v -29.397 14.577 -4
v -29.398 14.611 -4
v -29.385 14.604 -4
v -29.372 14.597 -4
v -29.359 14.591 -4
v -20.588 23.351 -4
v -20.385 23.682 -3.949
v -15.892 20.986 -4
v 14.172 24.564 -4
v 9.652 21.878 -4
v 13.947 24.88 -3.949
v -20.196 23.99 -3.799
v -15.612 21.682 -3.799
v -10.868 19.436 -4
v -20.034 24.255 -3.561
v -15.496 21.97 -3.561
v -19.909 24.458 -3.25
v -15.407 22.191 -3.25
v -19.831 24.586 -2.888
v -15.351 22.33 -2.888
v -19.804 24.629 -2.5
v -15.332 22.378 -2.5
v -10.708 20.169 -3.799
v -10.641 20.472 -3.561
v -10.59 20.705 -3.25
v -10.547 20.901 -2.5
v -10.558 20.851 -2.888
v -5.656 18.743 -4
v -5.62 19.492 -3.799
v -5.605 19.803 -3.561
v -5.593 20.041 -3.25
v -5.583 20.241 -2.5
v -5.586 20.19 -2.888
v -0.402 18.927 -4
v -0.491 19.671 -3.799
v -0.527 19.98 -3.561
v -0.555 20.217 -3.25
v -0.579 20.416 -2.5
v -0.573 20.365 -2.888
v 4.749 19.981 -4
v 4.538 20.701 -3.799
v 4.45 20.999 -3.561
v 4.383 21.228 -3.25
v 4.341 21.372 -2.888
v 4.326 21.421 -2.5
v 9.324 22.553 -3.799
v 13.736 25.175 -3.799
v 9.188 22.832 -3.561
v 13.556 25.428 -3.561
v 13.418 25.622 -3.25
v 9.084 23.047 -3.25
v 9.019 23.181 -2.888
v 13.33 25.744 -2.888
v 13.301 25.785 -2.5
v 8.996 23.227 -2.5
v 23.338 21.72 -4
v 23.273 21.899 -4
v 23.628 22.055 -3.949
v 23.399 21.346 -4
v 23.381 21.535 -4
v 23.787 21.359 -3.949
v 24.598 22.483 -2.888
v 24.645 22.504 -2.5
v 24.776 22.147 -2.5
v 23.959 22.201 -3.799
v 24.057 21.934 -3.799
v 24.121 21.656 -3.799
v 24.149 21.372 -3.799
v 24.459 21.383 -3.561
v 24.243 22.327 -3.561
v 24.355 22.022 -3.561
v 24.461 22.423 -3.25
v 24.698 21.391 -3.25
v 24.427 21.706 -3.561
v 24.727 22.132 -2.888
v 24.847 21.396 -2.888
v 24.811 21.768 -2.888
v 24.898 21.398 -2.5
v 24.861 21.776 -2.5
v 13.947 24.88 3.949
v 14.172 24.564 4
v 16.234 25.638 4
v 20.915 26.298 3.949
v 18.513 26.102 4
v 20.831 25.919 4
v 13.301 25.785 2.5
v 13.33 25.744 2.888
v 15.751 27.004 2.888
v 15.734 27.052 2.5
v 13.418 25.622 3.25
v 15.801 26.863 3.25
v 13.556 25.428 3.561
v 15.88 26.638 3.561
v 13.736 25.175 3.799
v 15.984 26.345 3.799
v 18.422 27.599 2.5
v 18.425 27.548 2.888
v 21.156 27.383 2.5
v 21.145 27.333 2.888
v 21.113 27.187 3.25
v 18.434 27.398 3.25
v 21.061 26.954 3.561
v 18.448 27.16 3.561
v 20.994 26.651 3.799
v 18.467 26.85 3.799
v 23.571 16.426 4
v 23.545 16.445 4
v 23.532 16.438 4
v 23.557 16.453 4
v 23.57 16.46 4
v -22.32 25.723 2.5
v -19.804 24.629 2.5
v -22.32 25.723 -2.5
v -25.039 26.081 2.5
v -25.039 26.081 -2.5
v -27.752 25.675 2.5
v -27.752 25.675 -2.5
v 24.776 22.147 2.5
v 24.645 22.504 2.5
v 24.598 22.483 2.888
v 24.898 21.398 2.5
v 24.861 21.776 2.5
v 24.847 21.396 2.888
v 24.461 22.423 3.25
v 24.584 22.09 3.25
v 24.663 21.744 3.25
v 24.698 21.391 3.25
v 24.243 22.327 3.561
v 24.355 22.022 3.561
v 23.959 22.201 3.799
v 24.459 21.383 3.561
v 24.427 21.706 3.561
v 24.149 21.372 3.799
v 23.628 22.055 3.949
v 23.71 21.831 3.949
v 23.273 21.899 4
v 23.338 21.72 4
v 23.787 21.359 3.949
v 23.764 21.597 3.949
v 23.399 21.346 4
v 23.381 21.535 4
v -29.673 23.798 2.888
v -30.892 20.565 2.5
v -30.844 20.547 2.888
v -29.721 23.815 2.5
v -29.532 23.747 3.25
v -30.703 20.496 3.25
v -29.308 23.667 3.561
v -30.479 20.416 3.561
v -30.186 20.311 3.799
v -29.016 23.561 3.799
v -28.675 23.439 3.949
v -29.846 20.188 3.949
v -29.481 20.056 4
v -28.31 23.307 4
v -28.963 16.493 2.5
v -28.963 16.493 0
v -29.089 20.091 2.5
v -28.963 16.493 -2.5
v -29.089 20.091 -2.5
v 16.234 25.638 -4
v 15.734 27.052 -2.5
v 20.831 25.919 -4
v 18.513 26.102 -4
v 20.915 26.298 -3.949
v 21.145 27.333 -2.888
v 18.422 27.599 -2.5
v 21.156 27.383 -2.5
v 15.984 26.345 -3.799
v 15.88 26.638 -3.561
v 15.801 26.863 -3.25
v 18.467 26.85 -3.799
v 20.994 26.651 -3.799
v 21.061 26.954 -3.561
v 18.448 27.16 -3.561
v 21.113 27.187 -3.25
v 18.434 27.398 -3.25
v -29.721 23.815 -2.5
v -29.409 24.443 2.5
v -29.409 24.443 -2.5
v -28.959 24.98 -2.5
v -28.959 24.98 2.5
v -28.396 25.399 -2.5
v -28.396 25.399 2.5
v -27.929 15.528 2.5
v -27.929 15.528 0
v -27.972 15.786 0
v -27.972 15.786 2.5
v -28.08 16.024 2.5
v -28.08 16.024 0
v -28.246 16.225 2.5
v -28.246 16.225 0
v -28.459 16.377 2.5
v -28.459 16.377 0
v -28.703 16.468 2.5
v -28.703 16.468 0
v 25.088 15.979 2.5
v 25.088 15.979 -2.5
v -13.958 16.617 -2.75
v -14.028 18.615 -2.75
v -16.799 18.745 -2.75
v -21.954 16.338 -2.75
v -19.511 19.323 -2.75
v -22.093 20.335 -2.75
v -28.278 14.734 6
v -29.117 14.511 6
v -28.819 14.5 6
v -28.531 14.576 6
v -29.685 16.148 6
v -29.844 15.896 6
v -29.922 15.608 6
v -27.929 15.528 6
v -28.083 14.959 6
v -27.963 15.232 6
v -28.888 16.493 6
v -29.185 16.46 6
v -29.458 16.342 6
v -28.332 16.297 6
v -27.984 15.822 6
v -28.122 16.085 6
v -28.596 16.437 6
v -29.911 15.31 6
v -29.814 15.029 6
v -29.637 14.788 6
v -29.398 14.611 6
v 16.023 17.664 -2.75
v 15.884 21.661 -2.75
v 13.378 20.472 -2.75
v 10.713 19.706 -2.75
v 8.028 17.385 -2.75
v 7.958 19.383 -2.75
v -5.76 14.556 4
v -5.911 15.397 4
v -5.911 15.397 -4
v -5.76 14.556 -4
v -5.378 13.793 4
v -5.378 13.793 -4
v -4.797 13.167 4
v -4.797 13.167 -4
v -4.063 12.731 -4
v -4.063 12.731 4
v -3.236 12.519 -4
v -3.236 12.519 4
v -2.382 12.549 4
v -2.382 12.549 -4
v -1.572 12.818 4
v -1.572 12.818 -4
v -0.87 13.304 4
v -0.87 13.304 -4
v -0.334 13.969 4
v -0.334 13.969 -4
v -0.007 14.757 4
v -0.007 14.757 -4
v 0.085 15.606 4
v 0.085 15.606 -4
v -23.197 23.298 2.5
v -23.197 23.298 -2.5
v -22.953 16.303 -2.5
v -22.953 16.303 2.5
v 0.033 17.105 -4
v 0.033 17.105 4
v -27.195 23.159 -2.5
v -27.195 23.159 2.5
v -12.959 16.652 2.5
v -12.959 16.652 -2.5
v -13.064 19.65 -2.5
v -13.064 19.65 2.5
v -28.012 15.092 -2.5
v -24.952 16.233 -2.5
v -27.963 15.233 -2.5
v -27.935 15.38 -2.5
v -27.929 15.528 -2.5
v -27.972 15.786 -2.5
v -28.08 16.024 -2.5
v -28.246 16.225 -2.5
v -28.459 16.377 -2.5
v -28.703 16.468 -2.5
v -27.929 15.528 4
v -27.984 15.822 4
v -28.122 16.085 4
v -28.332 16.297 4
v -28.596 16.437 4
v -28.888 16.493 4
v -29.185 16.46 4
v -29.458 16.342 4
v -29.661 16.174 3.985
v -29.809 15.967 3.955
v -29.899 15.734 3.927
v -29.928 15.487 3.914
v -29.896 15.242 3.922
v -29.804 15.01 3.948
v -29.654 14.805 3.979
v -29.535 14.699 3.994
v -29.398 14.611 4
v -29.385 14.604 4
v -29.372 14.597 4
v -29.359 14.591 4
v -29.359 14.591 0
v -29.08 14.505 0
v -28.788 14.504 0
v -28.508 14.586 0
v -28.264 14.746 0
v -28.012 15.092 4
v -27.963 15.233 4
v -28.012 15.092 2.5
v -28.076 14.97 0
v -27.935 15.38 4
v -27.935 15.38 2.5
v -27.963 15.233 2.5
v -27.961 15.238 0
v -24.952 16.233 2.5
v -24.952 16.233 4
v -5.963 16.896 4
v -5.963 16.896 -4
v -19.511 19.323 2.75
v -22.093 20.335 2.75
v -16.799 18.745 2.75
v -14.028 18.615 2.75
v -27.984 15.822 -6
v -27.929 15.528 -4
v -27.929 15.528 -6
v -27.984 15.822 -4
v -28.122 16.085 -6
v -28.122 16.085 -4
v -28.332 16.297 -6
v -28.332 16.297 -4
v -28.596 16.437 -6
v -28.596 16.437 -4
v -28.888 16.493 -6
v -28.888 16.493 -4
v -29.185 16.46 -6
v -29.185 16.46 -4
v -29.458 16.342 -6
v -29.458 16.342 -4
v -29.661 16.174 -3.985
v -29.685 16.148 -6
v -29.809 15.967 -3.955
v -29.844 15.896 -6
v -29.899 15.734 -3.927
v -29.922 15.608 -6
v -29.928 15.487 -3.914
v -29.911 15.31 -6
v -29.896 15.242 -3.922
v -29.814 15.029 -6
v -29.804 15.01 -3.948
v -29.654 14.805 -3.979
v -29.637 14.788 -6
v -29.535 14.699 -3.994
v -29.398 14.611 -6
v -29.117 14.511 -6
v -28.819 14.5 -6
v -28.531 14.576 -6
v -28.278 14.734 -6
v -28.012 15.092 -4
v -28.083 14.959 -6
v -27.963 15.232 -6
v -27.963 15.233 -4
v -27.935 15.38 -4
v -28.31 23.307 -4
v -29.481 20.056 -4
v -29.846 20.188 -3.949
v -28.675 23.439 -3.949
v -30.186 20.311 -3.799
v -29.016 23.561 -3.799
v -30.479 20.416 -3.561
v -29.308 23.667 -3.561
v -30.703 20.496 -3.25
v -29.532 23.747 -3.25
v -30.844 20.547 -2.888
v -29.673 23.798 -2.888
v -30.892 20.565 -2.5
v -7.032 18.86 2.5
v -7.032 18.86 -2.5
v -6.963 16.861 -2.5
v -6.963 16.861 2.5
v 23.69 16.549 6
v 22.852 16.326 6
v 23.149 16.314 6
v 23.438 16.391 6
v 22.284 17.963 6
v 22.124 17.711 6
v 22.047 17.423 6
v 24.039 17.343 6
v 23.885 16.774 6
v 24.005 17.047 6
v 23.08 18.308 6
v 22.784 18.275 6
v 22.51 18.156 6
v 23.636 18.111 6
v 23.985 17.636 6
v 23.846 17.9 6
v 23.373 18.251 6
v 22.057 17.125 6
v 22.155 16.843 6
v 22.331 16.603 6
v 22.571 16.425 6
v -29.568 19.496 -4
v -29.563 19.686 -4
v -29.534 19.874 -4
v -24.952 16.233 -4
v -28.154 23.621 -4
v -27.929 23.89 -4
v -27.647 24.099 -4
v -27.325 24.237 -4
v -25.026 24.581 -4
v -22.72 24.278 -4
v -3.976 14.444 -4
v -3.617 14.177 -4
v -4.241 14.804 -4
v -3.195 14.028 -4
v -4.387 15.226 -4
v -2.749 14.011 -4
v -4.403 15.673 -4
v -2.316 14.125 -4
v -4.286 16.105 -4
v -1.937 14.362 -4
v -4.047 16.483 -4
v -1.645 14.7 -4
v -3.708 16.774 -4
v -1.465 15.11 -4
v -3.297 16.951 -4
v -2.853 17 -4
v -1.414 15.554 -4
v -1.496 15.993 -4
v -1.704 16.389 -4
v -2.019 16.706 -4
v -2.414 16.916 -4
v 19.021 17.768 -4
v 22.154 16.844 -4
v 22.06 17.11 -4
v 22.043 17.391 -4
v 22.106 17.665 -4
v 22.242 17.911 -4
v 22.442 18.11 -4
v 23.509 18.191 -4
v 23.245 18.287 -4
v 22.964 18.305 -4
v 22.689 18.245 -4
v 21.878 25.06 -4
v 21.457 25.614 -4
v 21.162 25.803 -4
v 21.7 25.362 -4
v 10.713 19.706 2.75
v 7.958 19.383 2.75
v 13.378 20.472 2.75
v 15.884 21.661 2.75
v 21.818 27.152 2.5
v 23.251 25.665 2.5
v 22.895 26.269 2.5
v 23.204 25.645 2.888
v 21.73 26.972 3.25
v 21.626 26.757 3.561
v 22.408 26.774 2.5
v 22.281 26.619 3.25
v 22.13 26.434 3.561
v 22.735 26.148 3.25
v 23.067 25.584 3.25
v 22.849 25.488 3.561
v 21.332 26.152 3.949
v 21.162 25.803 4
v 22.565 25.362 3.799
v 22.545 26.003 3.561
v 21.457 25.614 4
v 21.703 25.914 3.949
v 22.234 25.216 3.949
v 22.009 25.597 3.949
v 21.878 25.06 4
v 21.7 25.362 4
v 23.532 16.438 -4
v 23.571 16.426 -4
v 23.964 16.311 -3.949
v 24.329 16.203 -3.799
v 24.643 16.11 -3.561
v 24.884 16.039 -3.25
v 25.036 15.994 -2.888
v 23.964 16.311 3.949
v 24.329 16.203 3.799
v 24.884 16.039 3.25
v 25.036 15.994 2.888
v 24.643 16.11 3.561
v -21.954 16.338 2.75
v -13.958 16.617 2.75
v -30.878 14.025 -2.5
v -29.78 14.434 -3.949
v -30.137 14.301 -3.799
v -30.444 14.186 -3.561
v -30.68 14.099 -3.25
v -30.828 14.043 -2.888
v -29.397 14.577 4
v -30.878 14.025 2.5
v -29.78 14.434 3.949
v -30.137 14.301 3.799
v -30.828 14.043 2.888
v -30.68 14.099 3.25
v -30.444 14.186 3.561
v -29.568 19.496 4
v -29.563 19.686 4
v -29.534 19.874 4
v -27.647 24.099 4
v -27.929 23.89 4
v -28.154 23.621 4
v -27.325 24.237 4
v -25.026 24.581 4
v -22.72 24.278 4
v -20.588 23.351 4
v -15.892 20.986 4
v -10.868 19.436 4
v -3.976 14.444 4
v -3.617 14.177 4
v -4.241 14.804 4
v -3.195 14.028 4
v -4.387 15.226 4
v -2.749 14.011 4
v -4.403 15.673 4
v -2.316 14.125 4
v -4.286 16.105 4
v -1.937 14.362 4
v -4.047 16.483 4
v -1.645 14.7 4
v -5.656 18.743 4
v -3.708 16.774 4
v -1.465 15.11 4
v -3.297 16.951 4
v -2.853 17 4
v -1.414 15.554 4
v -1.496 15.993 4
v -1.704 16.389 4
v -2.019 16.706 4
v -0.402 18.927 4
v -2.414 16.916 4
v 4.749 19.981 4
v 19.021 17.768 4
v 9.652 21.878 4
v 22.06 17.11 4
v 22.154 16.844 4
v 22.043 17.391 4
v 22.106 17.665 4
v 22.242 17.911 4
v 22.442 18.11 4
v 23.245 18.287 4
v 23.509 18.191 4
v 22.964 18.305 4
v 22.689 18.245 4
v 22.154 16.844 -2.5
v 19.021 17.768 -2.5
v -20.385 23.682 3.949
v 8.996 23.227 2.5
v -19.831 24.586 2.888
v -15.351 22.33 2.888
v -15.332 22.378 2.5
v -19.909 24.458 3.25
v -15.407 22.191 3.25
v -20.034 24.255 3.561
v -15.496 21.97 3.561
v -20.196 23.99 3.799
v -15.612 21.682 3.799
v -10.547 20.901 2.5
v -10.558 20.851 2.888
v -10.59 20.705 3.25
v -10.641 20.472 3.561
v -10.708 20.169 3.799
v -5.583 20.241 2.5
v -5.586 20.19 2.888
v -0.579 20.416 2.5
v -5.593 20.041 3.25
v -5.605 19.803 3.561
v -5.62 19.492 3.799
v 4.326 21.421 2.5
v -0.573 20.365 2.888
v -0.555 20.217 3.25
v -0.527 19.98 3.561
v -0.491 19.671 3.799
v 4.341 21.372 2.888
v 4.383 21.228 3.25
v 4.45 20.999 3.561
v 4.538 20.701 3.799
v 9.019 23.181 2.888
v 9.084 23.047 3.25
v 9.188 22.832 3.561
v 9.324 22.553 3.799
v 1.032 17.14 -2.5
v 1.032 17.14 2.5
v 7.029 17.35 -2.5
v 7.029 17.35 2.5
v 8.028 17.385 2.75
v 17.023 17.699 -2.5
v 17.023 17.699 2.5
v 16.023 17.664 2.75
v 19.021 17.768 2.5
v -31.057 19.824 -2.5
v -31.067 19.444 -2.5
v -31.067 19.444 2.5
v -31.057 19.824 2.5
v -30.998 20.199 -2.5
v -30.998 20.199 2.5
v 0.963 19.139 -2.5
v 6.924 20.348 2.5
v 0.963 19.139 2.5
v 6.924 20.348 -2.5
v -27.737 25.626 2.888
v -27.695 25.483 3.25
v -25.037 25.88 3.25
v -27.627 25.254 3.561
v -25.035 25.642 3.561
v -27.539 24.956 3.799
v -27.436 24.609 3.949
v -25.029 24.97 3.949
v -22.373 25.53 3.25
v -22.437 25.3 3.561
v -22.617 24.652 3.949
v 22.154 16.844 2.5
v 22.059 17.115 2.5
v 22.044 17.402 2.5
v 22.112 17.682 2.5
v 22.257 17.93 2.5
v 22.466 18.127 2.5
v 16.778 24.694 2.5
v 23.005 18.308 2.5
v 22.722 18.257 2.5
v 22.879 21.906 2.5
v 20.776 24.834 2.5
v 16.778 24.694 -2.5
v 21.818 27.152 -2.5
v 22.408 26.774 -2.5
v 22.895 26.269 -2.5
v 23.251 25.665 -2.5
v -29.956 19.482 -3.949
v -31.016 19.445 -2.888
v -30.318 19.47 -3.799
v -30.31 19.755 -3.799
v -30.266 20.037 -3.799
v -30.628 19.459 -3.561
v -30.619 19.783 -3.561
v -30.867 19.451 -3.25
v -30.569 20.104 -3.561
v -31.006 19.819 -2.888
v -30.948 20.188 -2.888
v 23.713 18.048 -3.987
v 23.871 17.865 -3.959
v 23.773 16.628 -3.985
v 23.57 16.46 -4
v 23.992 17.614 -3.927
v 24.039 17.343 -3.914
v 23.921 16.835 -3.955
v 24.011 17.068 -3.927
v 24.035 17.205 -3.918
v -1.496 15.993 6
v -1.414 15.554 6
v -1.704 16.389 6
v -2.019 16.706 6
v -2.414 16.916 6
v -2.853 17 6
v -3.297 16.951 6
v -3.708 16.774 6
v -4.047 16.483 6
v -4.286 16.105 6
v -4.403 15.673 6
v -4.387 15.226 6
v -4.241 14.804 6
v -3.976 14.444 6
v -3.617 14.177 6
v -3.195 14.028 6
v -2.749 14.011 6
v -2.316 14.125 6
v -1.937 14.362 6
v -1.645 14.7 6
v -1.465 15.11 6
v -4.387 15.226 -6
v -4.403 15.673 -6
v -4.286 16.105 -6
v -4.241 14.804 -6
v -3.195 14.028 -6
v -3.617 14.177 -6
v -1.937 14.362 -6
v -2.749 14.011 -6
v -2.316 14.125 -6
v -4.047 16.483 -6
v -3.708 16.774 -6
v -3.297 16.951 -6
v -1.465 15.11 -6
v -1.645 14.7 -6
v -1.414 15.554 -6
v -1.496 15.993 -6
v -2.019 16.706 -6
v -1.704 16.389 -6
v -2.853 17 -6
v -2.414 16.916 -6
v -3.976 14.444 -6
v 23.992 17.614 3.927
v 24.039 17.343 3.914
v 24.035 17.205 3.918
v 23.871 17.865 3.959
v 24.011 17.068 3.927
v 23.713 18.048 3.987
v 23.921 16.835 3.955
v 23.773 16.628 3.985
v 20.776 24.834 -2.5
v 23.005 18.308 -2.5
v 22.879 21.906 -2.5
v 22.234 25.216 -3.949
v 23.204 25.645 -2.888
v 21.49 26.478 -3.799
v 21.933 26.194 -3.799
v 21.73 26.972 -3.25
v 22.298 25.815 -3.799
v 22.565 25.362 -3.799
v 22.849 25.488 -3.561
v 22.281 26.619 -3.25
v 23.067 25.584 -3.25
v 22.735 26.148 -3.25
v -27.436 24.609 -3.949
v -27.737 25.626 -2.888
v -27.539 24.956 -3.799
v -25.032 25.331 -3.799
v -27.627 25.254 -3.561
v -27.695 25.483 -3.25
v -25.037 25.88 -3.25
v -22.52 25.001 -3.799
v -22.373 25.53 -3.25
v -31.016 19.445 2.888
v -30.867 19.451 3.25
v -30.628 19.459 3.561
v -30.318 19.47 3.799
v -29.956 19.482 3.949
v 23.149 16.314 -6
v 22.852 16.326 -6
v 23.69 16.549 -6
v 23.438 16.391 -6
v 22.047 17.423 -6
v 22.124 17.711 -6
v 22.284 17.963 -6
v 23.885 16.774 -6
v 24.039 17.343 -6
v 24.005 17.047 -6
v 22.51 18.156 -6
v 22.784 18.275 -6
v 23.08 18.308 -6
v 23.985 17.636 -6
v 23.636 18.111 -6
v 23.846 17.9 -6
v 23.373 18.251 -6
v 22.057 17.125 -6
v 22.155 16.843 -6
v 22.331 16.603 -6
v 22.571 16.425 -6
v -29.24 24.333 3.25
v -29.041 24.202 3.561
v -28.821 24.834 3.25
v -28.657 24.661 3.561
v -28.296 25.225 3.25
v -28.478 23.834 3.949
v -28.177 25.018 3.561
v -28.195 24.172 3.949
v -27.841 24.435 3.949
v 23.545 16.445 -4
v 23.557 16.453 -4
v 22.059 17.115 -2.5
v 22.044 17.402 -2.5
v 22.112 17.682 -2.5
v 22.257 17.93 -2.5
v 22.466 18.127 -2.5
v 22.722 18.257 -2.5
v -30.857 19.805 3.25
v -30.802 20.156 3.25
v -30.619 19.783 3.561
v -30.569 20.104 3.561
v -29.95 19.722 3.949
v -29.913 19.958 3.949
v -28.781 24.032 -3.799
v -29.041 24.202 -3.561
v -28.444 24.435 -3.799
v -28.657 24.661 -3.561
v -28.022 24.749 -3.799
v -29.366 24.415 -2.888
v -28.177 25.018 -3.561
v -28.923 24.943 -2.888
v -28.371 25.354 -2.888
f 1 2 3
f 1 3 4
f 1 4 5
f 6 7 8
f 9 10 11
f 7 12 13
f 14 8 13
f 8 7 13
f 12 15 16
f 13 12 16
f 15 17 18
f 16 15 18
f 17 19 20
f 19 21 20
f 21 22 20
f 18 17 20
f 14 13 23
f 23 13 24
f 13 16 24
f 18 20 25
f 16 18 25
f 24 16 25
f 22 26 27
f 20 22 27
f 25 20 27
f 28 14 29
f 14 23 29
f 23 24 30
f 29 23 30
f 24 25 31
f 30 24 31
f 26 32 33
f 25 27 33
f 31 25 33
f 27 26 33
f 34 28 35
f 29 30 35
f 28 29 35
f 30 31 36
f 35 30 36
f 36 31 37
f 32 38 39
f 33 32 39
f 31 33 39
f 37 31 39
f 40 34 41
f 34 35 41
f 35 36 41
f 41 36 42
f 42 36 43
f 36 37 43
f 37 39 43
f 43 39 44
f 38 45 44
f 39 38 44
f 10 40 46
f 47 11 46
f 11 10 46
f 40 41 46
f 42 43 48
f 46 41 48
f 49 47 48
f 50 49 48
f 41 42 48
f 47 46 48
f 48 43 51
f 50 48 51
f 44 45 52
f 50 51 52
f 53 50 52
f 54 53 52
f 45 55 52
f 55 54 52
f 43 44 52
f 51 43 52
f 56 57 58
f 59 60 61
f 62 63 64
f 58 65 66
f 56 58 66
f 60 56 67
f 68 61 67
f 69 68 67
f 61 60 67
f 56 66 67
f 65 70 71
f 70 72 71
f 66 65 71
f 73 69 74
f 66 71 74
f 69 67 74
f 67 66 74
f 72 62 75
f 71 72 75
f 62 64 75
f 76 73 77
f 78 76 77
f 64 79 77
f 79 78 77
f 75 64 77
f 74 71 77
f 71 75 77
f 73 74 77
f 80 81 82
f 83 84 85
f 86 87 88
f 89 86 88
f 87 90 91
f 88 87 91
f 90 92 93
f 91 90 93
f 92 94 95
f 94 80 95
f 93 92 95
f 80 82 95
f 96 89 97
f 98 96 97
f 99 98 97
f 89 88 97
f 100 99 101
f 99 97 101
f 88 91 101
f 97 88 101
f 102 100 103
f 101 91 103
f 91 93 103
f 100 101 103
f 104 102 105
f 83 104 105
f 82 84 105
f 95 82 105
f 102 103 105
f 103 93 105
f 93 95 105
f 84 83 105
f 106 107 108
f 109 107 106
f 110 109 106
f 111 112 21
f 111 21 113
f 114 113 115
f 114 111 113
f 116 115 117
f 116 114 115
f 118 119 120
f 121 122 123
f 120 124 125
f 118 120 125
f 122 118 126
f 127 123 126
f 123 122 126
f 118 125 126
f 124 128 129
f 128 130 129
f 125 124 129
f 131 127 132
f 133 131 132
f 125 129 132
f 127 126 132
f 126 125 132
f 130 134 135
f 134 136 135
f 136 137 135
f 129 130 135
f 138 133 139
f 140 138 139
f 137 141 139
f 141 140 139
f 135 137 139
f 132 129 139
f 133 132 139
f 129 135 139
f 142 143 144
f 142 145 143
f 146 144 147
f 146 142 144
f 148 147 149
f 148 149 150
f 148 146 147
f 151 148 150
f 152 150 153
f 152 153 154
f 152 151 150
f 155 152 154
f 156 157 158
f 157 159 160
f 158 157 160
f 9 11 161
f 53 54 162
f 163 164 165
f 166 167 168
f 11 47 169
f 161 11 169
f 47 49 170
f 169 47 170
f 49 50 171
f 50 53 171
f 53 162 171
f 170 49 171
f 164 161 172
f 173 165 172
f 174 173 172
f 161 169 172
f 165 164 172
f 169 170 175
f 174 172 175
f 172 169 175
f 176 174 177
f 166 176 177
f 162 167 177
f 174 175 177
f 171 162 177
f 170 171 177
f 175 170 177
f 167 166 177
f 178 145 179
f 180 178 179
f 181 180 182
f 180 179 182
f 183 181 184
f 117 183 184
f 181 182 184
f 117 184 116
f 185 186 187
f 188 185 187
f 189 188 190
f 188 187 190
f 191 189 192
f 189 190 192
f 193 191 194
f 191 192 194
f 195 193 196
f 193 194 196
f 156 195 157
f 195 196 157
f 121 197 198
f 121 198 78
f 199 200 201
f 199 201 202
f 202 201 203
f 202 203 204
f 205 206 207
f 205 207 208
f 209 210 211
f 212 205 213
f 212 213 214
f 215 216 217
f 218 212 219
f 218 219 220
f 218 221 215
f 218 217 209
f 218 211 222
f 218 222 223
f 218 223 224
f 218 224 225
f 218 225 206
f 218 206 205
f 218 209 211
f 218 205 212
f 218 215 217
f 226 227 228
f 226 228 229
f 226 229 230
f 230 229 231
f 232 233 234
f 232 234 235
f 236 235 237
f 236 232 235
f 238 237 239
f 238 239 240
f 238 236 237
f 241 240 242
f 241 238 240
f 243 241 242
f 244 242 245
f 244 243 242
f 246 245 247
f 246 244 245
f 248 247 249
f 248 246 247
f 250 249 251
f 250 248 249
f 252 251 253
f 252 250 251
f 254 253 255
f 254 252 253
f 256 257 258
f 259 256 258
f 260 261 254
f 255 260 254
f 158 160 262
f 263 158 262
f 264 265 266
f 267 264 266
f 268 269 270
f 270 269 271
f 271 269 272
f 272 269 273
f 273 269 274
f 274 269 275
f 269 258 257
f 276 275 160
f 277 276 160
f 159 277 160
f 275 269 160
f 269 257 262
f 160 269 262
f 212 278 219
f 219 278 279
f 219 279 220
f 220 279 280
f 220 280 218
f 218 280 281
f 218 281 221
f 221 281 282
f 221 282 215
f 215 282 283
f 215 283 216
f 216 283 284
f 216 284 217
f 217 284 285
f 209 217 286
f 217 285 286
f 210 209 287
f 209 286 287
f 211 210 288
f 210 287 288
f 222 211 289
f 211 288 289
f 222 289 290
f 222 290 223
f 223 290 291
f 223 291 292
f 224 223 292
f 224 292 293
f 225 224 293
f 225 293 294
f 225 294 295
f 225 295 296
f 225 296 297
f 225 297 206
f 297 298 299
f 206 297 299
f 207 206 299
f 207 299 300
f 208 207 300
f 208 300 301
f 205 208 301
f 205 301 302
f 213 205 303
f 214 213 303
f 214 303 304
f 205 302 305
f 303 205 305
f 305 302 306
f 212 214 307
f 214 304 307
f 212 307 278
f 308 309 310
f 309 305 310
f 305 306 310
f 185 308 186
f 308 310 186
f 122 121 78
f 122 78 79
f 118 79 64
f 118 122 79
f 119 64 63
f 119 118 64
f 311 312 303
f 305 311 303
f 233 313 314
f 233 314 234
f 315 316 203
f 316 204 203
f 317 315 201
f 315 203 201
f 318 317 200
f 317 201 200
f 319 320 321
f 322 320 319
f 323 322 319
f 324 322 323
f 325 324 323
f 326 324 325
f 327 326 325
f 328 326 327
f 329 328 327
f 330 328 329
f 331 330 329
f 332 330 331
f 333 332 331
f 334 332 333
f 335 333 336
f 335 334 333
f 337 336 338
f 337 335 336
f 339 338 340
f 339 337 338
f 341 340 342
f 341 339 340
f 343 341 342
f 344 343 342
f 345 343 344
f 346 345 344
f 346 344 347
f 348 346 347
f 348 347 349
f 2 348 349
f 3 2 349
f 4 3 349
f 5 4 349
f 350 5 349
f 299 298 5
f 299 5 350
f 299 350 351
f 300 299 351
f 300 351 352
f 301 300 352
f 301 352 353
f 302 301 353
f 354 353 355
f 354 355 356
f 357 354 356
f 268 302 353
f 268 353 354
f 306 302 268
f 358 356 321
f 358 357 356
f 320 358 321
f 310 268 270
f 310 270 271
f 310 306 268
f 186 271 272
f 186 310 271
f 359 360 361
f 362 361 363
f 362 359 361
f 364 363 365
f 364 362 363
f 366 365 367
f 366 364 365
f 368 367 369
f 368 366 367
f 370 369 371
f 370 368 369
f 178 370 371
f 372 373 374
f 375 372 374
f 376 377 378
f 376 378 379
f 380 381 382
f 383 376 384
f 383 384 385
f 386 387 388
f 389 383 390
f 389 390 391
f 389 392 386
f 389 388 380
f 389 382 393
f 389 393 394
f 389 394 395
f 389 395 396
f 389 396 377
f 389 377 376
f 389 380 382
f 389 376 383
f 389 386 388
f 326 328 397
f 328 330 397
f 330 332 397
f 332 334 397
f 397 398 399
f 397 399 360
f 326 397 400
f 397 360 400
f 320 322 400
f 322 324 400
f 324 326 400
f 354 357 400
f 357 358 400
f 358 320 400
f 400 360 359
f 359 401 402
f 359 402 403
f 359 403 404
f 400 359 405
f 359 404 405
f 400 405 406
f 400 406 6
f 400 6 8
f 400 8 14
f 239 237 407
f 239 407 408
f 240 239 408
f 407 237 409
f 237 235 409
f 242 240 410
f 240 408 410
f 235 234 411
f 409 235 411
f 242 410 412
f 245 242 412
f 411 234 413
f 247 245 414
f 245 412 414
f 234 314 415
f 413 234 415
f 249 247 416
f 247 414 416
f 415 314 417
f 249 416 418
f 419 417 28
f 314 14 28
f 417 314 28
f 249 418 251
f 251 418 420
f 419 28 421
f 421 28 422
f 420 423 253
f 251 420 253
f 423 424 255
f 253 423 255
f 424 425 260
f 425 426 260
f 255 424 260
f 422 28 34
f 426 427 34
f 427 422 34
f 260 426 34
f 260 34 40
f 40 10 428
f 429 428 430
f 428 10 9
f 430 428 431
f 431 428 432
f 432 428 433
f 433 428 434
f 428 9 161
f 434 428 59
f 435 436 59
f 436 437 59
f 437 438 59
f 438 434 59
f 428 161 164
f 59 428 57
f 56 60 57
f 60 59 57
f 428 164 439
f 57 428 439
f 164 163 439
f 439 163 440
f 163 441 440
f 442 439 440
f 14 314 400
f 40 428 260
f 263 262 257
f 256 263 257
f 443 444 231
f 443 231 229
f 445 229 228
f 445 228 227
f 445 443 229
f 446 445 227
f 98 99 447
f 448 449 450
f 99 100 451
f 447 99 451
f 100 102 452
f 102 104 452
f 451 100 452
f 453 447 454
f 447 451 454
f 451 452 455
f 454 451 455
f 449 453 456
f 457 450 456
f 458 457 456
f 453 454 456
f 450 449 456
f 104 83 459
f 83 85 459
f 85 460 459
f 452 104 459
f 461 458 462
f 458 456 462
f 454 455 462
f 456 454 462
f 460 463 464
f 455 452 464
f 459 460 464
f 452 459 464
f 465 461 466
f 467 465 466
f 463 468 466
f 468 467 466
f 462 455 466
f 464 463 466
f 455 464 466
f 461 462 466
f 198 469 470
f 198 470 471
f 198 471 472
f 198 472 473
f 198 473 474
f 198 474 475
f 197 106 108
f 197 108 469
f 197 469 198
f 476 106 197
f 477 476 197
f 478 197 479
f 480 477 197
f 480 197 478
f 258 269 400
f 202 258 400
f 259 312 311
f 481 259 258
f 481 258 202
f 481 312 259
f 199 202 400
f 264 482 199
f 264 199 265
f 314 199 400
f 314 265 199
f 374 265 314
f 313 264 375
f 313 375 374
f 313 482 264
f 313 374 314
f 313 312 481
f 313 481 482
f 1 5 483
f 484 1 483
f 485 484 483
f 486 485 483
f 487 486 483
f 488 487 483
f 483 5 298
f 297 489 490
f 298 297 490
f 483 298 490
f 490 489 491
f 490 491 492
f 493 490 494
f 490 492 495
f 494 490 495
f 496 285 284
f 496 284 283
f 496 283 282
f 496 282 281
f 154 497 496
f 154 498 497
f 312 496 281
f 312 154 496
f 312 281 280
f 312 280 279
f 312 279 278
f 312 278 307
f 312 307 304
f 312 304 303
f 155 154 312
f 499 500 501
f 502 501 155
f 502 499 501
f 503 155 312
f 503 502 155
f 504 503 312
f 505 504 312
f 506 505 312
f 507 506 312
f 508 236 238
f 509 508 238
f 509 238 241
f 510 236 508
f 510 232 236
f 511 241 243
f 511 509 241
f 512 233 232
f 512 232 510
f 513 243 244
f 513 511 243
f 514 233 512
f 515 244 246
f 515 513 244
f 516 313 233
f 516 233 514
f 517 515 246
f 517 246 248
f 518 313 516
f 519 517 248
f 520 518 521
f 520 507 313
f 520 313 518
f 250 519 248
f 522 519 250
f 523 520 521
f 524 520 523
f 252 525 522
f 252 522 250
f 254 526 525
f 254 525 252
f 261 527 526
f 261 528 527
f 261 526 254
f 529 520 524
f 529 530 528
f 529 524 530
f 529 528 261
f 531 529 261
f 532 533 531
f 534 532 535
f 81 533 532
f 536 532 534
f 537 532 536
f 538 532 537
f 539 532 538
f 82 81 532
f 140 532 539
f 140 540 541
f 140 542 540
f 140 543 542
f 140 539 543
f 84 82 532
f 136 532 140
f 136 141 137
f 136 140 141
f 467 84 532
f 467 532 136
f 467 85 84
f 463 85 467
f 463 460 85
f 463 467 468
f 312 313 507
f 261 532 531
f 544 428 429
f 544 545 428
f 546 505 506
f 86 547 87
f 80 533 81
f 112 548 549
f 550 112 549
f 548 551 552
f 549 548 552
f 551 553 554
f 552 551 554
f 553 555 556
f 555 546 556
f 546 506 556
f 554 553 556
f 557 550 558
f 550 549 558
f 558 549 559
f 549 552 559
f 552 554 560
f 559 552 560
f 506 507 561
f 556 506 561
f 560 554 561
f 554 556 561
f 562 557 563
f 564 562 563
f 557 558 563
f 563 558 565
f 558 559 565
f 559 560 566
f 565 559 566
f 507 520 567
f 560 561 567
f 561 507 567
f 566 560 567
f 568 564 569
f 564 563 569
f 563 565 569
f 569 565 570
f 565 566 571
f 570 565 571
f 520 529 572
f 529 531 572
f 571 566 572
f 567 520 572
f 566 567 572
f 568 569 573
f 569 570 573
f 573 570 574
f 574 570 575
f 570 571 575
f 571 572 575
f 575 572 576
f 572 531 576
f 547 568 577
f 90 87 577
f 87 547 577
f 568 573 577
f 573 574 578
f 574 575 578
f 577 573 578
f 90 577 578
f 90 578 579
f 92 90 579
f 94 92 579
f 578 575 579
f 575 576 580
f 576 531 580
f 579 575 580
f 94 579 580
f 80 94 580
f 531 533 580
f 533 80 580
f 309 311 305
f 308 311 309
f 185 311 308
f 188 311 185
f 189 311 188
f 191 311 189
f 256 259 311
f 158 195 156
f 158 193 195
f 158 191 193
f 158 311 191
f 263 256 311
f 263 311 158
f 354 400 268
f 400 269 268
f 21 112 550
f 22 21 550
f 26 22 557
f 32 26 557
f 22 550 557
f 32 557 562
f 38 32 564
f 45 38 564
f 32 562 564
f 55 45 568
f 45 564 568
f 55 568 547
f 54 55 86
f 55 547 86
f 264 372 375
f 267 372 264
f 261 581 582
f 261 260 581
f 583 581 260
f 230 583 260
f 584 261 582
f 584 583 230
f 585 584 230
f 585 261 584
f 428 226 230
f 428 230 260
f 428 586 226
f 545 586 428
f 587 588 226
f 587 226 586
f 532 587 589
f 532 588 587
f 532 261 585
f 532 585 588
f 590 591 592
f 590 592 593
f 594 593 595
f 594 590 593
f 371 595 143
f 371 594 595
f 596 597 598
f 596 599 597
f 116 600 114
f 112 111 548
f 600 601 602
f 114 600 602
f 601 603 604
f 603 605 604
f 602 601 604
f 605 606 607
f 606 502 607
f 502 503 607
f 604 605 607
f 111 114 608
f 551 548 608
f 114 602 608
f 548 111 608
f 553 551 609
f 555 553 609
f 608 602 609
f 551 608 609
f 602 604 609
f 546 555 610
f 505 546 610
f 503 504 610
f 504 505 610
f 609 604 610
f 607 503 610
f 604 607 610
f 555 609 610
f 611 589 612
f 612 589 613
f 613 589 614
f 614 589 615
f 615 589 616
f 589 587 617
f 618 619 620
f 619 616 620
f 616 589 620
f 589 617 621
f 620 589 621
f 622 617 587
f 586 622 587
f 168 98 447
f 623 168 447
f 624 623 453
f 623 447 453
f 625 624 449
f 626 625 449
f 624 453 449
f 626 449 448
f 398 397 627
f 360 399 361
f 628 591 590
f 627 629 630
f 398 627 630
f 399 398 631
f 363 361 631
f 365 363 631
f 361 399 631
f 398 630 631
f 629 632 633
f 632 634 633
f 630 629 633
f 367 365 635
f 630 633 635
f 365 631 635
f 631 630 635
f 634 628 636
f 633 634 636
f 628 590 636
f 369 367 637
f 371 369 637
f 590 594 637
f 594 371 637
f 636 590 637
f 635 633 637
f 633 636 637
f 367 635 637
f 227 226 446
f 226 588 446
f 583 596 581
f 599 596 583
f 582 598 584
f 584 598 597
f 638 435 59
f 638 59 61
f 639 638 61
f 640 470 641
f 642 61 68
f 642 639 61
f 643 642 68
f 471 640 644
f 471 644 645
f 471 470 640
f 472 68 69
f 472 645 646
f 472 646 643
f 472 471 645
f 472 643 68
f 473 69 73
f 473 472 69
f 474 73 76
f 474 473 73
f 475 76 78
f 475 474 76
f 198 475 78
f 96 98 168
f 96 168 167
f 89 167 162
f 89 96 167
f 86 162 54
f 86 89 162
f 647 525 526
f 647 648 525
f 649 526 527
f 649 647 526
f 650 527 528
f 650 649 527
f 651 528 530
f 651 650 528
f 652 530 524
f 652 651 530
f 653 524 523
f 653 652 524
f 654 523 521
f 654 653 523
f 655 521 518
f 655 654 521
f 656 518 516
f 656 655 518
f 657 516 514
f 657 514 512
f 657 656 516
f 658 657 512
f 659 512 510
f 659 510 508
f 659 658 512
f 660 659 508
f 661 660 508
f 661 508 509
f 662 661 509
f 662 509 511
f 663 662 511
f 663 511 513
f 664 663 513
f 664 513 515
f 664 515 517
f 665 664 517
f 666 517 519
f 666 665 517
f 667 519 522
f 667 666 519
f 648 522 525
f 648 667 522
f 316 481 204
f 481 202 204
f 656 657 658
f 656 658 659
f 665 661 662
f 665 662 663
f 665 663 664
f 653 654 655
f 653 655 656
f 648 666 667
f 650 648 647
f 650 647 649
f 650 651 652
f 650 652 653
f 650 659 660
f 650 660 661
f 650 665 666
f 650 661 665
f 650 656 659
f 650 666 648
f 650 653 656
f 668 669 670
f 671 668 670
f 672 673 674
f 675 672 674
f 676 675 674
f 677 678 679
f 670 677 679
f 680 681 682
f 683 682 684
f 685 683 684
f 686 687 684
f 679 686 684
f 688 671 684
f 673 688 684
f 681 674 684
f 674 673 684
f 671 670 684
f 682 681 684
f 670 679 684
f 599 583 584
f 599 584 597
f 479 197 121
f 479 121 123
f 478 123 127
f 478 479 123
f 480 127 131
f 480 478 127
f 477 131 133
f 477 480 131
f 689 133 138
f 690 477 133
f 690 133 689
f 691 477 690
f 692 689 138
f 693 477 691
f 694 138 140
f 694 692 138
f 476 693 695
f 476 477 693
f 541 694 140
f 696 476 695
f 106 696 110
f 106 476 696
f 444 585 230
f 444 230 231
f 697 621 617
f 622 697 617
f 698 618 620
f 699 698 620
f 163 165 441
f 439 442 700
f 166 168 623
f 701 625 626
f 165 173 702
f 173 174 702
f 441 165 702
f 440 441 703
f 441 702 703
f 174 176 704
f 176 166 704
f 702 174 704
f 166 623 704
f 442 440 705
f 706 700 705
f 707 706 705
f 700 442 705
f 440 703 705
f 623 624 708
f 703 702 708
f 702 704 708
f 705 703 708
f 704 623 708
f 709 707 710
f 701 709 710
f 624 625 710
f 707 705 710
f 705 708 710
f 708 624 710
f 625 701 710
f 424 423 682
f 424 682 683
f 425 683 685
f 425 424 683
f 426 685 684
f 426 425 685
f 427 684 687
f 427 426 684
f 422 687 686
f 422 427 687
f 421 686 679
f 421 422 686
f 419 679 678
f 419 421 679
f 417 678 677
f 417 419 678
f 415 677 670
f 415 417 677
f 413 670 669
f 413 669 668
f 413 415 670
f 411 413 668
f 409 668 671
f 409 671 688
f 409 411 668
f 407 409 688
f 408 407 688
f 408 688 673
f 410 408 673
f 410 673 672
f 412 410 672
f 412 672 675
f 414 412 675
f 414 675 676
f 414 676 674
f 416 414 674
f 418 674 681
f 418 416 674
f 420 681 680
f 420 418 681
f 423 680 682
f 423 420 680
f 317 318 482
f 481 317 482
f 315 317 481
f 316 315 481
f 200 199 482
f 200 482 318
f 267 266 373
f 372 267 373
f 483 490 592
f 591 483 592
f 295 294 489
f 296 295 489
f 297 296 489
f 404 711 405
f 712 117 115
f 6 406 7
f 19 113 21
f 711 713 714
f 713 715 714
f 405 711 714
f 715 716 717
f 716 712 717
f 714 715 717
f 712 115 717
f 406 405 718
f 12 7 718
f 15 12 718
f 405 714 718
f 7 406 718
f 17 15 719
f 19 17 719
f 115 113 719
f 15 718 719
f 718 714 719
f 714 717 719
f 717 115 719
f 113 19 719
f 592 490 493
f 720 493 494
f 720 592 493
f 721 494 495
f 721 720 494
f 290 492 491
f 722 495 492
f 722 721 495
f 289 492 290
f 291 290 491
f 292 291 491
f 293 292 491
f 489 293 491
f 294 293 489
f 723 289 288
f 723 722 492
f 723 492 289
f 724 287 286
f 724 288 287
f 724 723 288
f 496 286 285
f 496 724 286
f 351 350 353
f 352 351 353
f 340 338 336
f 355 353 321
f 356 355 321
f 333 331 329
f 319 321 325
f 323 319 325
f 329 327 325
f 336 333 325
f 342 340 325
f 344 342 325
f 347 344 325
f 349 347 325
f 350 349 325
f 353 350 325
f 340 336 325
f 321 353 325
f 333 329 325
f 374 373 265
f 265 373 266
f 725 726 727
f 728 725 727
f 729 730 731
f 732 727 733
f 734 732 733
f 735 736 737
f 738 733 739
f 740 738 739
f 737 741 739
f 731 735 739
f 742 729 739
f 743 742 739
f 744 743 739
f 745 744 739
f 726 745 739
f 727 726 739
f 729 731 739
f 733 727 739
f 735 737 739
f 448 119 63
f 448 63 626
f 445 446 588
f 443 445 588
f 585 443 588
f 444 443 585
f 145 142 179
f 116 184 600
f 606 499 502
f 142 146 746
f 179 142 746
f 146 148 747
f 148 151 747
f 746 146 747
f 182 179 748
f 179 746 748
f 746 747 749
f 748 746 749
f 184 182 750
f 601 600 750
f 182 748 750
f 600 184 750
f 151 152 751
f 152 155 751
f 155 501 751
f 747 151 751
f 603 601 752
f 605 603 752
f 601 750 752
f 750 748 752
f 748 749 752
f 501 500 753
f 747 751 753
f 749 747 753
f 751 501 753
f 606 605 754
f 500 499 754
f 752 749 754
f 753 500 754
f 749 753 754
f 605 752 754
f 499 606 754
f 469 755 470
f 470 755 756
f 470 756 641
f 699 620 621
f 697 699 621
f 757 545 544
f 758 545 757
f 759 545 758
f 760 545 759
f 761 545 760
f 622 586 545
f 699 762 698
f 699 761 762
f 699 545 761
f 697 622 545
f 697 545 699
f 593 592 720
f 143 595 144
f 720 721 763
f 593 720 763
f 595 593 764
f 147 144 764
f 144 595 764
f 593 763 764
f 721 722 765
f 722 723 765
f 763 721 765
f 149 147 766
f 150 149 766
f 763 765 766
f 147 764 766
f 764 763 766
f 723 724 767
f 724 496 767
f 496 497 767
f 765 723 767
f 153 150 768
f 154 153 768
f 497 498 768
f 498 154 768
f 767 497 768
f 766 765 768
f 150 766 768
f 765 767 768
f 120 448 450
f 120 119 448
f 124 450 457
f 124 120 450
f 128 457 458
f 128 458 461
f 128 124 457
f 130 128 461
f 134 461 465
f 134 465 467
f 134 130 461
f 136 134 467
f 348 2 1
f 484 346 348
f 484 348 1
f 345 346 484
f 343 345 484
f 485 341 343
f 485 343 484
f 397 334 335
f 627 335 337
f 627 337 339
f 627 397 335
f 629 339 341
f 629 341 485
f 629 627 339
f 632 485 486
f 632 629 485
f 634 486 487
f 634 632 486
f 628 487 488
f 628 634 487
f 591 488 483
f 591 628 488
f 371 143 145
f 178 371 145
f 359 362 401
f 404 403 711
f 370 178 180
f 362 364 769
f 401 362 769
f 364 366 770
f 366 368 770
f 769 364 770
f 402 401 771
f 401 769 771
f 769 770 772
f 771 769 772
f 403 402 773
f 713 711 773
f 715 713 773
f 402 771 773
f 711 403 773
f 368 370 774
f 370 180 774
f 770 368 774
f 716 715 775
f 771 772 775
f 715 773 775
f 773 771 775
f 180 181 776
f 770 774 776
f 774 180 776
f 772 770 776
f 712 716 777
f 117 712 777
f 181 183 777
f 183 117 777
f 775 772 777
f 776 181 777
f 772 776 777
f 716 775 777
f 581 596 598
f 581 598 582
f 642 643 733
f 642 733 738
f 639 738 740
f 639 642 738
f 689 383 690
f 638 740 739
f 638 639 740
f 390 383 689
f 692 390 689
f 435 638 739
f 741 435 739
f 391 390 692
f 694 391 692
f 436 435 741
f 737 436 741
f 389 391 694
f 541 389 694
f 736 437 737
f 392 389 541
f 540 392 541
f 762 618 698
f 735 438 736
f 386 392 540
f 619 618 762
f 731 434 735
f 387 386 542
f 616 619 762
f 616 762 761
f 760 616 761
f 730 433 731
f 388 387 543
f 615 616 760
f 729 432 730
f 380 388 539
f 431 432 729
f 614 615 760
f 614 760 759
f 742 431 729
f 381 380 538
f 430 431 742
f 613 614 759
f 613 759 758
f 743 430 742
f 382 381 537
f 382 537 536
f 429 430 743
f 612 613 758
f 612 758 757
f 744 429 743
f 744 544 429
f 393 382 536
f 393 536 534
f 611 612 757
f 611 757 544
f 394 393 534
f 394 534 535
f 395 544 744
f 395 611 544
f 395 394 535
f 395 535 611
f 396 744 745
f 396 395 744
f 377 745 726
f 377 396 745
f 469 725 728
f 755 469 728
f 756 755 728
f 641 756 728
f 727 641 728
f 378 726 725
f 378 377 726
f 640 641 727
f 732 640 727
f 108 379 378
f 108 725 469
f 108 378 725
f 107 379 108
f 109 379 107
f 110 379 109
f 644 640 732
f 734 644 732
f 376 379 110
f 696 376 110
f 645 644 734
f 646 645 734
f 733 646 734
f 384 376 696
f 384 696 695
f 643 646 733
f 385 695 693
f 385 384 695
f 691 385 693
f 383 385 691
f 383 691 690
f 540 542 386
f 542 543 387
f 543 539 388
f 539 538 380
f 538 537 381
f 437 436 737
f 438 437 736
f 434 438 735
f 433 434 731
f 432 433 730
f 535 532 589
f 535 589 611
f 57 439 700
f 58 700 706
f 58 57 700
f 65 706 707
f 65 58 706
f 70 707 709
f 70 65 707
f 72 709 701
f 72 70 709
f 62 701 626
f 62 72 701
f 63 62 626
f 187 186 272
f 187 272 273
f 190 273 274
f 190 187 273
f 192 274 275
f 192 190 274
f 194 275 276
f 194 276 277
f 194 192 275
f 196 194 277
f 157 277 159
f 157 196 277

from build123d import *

# Parameters (mm, degrees)
PAD103_DEPTH            = 4
POCKET044_DEPTH         = 2.75
POCKET045_DEPTH         = 2.5
SKETCH192_R             = 1.5
PAD104_DEPTH            = 6
FILLET006_R             = 3
FILLET007_R             = 1.5
SKETCH221_R             = 1
PAD116_DEPTH            = 6
BODY154_ROLL_ANGLE      = -90
BODY154_PLACEMENT_ANGLE = 2


with BuildPart() as part:
    # Sketch188 → Pad103 (new body, symmetric)
    with BuildSketch(Plane.XZ):
        with BuildLine():
            Line((-22, 0), (-3, 0))
            Line((-3, 0), (-3, -1.5))
            ThreePointArc((-3, -1.5), (0, -4.5), (3, -1.5))
            Line((3, 0), (3, -1.5))
            Line((3, 0), (22, 0))
            Line((22, 0), (28, -2))
            Line((28, -2), (28, 4))
            Line((28, 4), (26, 9))
            ThreePointArc((26, 9), (21.180343, 9.814691), (16.562583, 8.211851))
            ThreePointArc((-16.562583, 8.211851), (0, 3.225464), (16.562583, 8.211851))
            ThreePointArc((-16.562583, 8.211851), (-21.180343, 9.814691), (-26, 9))
            Line((-28, 4), (-26, 9))
            Line((-28, -2), (-28, 4))
            Line((-22, 0), (-28, -2))
        make_face()
    extrude(amount=PAD103_DEPTH, both=True)

    # Sketch190 → Pocket044 (cut, symmetric)
    with BuildSketch(Plane.XZ):
        with BuildLine():
            ThreePointArc((-19, 4), (-15.123106, 2.507577), (-11, 2))
            Line((-11, 0), (-11, 2))
            Line((-11, 0), (-19, 0))
            Line((-19, 0), (-19, 4))
        make_face()
        with BuildLine():
            ThreePointArc((11, 2), (15.123106, 2.507577), (19, 4))
            Line((19, 0), (19, 4))
            Line((11, 0), (19, 0))
            Line((11, 0), (11, 2))
        make_face()
    extrude(amount=POCKET044_DEPTH, both=True, mode=Mode.SUBTRACT)

    # Sketch191 → Pocket045 (cut, symmetric)
    with BuildSketch(Plane.XZ):
        Polygon((-26, -2), (-26, 4), (-24, 7), (-20, 7), (-20, -2), align=None)
        Polygon((-10, -2), (-10, 3), (-4, 2), (-4, -2), align=None)
        Polygon((10, -2), (10, 3), (4, 2), (4, -2), align=None)
        Polygon((26, -2), (26, 4), (24, 7), (20, 7), (20, -2), align=None)
    extrude(amount=POCKET045_DEPTH, both=True, mode=Mode.SUBTRACT)

    # Sketch192 → Pad104 (join, symmetric)
    with BuildSketch(Plane.XZ):
        with Locations((0, -1.5)):
            Circle(SKETCH192_R)
    extrude(amount=PAD104_DEPTH, both=True)

    # Fillet006
    fillet006_edges = [part.edges().sort_by_distance(p)[0] for p in [
        (-28, 0, 4),
        (-26, 0, 9),
        (26, 0, 9),
        (28, 0, 4),
    ]]
    fillet(fillet006_edges, radius=FILLET006_R)

    # Fillet007
    fillet007_edges = [part.edges().sort_by_distance(p)[0] for p in [
        (-28, 4, 0.711126),
        (-27.143844, 4, 6.140391),
        (-25.699112, 4, 8.881973),
        (-20.375073, 4, 9.713888),
        (0, 4, 3.225464),
        (20.375073, 4, 9.713888),
        (25.699112, 4, 8.881973),
        (27.143844, 4, 6.140391),
        (28, 4, 0.711126),
        (-27.945869, 4, 3.989575),
        (27.945869, 4, 3.989575),
        (-28, -4, 0.711126),
        (-27.945869, -4, 3.989575),
        (-27.143844, -4, 6.140391),
        (-25.699112, -4, 8.881973),
        (-20.375073, -4, 9.713888),
        (0, -4, 3.225464),
        (20.375073, -4, 9.713888),
        (25.699112, -4, 8.881973),
        (27.143844, -4, 6.140391),
        (27.945869, -4, 3.989575),
        (28, -4, 0.711126),
    ]]
    fillet(fillet007_edges, radius=FILLET007_R)

    # Sketch221 → Pad116 (join, symmetric)
    with BuildSketch(Plane.XZ):
        with Locations((-26, -0.6)):
            Circle(SKETCH221_R)
        with Locations((26, -0.6)):
            Circle(SKETCH221_R)
    extrude(amount=PAD116_DEPTH, both=True)


with BuildPart() as part_1:
    # Body147 placement: moved
    add(part.part.moved(Location((0, 0, -1))))


with BuildPart() as part_2:
    # Body154 roll: moved
    add(part_1.part.rotate(Axis((0, 0, 0), (1, 0, 0)), BODY154_ROLL_ANGLE))


with BuildPart() as part_3:
    # Body154 placement: moved
    add(part_2.part.moved(Location((-3, 18, 0))).rotate(Axis((-3, 18, 0), (0, 0, 1)), BODY154_PLACEMENT_ANGLE))


solid = part_3.part
